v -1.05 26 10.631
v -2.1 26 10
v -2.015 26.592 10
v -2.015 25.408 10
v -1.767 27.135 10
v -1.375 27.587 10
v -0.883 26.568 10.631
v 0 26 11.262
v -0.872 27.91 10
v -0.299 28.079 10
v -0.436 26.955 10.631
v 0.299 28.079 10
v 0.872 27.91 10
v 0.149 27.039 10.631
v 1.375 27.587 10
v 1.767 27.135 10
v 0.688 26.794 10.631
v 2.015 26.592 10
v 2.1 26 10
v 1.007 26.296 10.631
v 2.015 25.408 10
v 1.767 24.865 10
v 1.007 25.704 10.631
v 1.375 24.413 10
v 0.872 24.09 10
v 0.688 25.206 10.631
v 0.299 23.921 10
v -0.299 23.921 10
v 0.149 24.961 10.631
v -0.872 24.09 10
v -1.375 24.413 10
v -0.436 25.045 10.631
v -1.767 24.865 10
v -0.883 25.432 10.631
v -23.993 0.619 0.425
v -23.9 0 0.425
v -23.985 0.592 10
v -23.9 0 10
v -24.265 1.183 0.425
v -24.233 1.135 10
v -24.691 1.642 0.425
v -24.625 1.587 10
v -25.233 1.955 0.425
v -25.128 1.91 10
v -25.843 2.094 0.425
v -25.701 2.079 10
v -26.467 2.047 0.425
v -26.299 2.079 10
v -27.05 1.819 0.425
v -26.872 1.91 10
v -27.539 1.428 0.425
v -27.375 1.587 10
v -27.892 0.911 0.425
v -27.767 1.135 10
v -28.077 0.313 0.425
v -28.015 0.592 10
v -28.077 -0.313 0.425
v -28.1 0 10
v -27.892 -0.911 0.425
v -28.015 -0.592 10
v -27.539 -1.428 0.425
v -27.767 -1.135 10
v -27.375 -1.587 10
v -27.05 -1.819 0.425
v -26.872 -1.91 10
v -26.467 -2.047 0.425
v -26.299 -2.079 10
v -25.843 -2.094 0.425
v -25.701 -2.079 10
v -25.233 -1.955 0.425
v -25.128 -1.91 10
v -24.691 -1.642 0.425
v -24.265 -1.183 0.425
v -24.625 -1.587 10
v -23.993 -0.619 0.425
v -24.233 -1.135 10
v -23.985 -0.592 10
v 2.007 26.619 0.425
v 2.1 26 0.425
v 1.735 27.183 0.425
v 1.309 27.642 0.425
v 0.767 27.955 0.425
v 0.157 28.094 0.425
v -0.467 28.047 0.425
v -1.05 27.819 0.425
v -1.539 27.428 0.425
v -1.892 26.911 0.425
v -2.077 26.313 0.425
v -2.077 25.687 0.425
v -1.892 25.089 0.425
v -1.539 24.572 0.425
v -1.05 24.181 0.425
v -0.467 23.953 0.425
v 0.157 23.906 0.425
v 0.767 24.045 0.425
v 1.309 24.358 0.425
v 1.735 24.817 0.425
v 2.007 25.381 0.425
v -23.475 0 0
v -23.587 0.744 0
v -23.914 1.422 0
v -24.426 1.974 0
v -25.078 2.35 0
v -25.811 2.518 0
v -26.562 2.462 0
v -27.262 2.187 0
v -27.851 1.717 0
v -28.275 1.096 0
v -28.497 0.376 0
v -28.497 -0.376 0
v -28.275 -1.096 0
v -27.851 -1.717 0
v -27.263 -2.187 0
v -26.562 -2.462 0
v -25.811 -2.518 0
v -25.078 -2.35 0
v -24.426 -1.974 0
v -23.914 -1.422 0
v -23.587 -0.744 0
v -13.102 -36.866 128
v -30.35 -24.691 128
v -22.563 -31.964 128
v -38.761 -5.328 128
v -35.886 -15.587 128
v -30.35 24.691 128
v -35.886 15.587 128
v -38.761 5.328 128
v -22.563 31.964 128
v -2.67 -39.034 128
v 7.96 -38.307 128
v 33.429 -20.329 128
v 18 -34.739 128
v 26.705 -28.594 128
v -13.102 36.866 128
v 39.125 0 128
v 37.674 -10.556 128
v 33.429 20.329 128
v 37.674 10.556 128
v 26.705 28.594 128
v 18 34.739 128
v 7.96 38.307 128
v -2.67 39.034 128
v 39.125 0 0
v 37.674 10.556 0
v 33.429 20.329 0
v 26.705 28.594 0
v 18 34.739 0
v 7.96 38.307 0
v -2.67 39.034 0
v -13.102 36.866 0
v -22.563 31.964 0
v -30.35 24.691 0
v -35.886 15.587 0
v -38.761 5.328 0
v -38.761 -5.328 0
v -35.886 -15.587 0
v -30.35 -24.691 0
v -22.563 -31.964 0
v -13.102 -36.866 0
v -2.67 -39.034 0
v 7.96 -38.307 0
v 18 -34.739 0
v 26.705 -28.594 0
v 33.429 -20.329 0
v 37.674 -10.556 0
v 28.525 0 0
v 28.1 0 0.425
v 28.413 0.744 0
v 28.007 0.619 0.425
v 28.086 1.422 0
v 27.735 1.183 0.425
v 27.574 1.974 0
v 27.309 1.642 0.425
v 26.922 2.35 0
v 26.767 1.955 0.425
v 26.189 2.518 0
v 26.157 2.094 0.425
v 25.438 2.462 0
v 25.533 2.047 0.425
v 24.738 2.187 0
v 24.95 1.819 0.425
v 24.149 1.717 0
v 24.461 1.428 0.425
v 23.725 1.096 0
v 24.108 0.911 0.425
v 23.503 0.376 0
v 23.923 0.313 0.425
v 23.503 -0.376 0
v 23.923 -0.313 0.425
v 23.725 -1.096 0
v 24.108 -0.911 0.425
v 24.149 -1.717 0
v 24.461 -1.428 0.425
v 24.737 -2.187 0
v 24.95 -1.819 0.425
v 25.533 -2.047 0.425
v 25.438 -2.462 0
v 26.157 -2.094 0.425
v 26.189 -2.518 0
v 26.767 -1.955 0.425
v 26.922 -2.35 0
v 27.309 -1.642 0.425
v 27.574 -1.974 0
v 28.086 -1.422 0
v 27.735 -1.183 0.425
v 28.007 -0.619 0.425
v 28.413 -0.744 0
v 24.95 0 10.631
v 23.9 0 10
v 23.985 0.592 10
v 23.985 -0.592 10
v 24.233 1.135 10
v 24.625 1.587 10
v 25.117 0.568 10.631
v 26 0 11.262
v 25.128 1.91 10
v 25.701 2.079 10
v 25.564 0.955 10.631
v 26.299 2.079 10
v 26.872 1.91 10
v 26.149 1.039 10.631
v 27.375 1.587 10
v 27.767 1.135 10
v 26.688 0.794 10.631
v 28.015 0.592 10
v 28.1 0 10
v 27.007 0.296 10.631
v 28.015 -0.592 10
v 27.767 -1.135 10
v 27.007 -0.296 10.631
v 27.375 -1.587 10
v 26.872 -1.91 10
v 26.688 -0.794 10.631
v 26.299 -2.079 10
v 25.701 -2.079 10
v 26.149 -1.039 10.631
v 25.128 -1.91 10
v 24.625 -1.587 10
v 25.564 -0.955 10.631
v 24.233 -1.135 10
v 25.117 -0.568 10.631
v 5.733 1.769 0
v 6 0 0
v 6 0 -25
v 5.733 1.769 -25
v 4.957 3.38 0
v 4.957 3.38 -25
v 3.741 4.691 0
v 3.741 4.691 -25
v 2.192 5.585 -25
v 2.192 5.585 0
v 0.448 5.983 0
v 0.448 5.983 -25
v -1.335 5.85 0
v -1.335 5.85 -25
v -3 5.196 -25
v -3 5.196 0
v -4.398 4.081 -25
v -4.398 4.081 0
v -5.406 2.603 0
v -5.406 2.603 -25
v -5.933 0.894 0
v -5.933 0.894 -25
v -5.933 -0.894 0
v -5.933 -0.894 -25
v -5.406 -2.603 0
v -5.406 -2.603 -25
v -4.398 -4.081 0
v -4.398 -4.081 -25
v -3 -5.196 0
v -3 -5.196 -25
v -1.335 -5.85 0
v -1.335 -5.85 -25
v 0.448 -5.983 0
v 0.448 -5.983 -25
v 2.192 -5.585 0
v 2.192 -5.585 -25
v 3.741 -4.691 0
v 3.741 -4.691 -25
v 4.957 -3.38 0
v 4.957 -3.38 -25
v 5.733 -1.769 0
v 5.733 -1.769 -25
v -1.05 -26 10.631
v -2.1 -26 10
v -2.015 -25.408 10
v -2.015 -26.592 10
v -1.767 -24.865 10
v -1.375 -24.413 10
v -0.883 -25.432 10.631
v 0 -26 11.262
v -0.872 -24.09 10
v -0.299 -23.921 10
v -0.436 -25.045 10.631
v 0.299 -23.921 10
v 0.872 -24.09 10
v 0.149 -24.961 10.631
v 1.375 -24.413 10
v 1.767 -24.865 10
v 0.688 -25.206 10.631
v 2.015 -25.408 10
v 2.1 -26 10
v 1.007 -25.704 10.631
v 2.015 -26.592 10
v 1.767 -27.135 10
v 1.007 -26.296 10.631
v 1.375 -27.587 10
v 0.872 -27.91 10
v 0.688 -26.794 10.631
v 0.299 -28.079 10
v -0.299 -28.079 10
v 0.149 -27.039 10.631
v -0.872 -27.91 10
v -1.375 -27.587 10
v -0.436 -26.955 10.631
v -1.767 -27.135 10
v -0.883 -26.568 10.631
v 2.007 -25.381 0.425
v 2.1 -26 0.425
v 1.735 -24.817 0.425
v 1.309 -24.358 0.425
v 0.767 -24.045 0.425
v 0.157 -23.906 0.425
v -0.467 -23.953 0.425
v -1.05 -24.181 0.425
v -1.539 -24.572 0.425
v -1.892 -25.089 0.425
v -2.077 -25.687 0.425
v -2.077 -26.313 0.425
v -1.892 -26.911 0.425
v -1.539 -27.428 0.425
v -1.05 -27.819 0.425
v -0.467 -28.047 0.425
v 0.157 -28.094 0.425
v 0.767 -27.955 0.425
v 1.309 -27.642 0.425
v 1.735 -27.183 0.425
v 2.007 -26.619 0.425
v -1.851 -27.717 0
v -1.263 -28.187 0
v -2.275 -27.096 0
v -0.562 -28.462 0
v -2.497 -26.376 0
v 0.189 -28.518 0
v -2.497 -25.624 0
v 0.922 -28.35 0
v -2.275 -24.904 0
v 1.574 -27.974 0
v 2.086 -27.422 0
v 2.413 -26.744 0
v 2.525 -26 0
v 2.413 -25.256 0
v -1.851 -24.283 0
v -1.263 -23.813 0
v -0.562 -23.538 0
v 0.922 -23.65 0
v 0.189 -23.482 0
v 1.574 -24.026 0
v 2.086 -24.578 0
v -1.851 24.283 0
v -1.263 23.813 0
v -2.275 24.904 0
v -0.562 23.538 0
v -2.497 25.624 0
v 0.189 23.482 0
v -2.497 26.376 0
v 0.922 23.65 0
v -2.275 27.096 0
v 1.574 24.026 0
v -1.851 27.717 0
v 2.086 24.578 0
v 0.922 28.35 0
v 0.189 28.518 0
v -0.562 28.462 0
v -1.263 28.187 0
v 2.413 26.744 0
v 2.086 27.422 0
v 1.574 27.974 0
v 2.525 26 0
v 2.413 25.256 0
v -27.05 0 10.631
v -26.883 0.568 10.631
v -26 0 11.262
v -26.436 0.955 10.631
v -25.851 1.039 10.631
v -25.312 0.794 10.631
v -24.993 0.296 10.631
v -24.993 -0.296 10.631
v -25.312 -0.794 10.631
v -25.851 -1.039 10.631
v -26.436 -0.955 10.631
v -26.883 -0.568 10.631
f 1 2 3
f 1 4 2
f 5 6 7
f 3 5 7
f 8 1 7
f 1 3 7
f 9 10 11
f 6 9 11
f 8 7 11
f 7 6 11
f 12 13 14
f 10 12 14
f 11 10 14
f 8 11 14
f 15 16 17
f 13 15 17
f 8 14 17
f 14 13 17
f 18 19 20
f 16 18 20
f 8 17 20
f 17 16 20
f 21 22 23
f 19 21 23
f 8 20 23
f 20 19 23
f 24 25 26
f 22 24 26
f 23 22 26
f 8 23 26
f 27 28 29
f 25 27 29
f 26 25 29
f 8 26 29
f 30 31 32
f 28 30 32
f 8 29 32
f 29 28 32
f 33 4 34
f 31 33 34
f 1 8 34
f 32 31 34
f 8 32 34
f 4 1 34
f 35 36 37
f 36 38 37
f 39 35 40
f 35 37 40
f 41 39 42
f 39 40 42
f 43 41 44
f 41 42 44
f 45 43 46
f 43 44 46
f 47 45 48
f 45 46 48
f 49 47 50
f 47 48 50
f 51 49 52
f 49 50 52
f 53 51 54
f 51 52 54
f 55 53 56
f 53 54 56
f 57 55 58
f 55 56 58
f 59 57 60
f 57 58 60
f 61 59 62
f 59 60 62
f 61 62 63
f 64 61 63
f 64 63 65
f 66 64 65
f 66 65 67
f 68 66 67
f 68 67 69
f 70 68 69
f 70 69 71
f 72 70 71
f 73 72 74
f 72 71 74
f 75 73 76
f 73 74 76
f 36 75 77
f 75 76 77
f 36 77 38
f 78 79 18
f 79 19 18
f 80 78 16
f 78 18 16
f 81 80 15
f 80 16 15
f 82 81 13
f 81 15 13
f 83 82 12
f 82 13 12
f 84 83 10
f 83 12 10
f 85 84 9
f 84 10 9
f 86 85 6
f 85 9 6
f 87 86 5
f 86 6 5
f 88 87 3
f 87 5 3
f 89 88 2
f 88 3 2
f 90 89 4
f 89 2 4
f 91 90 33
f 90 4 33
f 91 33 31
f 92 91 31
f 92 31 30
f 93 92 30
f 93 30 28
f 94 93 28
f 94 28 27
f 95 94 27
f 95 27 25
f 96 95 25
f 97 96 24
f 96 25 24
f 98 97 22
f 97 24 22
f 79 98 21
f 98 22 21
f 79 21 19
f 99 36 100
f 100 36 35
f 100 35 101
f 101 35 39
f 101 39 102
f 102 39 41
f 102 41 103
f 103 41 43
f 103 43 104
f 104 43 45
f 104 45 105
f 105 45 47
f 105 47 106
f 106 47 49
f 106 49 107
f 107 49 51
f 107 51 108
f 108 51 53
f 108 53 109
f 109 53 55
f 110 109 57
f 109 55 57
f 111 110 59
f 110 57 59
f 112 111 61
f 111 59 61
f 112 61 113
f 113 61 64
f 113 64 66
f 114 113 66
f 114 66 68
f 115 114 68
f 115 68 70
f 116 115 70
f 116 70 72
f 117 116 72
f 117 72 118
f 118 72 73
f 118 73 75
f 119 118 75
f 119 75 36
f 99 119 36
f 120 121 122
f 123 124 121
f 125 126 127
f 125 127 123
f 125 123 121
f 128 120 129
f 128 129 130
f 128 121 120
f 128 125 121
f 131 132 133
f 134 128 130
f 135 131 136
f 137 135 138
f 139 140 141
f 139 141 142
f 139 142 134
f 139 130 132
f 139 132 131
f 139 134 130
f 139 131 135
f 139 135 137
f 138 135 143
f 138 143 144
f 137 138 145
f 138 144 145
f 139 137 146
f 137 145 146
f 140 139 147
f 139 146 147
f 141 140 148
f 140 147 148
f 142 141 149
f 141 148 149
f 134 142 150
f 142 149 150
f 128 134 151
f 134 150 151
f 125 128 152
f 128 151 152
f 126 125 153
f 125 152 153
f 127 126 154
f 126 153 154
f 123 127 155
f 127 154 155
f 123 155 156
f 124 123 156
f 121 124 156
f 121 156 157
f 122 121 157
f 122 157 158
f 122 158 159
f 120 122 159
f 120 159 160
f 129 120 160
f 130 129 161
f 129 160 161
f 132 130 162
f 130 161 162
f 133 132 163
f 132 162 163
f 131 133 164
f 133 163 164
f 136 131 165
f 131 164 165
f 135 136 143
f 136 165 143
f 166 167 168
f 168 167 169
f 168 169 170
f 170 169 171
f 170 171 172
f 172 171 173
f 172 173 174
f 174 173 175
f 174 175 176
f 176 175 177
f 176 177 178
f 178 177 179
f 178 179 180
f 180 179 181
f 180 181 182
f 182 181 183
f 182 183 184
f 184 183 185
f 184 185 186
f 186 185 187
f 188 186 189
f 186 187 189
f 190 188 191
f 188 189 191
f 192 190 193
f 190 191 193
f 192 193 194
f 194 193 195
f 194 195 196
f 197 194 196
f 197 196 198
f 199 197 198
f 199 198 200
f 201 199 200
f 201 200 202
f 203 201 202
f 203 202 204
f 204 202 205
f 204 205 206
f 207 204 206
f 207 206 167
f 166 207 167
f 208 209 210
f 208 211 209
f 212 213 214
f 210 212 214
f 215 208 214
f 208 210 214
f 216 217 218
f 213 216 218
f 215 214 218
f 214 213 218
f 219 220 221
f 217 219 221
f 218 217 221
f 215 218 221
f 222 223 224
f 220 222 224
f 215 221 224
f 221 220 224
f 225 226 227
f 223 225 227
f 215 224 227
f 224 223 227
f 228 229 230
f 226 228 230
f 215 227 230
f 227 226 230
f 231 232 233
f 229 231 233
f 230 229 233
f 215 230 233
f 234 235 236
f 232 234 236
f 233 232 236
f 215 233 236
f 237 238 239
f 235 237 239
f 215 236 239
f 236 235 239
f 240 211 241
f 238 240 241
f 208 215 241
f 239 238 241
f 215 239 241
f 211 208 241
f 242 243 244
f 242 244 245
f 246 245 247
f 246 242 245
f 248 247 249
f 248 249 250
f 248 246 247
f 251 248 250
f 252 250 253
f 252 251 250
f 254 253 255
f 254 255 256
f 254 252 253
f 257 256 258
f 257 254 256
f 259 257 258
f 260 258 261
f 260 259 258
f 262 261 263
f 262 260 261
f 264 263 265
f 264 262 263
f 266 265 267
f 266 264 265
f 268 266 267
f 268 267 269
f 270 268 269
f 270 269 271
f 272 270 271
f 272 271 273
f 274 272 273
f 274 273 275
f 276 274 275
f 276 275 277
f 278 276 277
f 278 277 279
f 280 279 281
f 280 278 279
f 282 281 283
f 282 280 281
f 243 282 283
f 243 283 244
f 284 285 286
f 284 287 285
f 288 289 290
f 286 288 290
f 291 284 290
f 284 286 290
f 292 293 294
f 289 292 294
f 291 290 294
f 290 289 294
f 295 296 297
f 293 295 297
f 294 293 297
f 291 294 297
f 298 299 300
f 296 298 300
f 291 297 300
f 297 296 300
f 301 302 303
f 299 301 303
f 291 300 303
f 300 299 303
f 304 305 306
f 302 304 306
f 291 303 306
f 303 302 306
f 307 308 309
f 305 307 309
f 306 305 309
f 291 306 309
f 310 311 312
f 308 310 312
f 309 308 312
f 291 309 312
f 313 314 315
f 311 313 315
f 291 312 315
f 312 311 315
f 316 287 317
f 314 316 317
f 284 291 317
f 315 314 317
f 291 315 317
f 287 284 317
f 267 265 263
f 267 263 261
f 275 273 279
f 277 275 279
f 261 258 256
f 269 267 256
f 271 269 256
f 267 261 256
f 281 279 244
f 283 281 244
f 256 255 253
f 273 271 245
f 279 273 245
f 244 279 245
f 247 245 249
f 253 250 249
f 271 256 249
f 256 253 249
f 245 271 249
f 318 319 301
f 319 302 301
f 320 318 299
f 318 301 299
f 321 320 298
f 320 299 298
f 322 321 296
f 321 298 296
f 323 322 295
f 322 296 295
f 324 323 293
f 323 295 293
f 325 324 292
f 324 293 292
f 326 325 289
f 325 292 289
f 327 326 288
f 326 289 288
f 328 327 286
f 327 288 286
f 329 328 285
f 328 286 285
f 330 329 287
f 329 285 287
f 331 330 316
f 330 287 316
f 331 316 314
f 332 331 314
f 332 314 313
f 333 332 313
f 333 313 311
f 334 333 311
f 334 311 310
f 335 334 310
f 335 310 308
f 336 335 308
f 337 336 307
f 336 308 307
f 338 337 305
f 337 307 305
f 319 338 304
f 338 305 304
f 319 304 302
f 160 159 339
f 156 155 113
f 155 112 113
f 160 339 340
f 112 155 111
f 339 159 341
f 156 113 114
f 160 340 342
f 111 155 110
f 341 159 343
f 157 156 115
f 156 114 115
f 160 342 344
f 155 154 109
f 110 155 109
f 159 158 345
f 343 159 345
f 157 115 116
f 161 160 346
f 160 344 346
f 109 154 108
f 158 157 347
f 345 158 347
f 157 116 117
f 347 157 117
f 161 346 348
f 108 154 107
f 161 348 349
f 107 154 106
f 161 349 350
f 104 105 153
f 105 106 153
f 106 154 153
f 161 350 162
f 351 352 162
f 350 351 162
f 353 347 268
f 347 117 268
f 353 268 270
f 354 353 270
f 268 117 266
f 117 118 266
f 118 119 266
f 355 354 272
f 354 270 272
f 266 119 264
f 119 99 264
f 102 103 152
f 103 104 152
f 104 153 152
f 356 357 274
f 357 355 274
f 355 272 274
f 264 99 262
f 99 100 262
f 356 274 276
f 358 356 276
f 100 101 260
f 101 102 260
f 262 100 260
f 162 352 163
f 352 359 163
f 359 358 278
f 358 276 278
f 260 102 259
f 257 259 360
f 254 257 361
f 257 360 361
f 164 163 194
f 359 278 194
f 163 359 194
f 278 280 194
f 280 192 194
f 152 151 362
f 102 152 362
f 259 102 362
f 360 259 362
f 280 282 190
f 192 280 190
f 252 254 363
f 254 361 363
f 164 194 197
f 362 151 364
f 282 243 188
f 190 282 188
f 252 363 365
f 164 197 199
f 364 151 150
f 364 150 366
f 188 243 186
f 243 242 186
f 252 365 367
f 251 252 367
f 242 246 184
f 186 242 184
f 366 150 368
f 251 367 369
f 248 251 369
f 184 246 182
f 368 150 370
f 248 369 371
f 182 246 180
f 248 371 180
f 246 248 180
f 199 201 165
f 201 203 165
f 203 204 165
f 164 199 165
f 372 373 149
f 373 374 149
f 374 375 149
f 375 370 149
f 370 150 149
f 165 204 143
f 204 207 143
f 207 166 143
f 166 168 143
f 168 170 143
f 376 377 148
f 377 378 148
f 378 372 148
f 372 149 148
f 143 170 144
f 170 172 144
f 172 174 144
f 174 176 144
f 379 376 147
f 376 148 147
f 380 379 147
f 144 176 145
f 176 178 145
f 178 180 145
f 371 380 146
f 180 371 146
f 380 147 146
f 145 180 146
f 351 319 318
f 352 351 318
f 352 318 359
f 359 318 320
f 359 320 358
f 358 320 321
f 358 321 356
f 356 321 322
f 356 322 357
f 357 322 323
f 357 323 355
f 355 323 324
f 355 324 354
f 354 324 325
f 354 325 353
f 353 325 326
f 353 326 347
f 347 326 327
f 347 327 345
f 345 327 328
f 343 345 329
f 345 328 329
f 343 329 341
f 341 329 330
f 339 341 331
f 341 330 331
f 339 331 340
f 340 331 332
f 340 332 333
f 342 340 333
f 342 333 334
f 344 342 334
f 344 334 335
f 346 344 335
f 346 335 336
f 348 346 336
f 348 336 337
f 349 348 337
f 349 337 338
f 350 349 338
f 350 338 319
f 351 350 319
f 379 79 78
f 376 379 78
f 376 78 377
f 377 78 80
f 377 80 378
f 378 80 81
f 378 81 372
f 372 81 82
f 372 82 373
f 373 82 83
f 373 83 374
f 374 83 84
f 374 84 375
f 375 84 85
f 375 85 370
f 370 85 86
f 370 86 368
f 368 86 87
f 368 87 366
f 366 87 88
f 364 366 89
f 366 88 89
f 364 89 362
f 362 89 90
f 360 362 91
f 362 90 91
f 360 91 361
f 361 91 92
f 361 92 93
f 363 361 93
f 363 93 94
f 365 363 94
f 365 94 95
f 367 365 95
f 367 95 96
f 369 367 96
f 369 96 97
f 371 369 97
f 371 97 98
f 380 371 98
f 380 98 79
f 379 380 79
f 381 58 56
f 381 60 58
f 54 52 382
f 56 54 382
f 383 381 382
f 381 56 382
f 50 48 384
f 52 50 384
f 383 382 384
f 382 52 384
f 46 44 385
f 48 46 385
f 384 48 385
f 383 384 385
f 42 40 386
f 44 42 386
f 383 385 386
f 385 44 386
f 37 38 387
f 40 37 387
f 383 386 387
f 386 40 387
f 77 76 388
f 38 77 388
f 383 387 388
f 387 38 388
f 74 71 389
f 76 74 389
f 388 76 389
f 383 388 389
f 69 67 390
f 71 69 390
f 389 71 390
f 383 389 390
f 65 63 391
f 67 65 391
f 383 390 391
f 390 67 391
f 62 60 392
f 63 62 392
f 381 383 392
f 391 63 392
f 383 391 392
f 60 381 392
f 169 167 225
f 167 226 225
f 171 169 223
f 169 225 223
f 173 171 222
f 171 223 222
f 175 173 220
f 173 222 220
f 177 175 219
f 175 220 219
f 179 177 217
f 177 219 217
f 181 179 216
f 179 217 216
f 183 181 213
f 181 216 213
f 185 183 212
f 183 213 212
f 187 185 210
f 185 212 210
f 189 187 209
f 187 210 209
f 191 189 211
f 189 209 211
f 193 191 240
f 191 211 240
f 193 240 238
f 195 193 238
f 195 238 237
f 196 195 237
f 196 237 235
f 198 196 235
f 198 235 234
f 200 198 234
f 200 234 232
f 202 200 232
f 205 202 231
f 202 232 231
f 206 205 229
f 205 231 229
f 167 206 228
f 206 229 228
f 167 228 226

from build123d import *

# Parameters (mm, degrees)
ESBO_O1_R                       = 39.125
RESSALTO_EXTRUS_O1_DEPTH        = 128
FURO_ROSCADO_DE_M51_D           = 4.2
FURO_ROSCADO_DE_M51_DEPTH       = 10
FURO_ROSCADO_DE_M51_CSINK_D     = 5.05
FURO_ROSCADO_DE_M51_CSINK_ANGLE = 90
FURO_ROSCADO_DE_M51_TIP         = 1.2618073
ESBO_O1_4_R                     = 6
RESSALTO_EXTRUS_O2_DEPTH        = 25


with BuildPart() as part:
    # Esboço1 → Ressalto-extrusão1 (new body)
    with BuildSketch(Plane.XY):
        Circle(ESBO_O1_R)
    extrude(amount=RESSALTO_EXTRUS_O1_DEPTH)

    # Furo roscado de M51
    with Locations(Plane(origin=(0, 0, 0), x_dir=(-1, 0, 0), z_dir=(0, 0, -1))):
        with Locations((0, 26), (-26, 0), (0, -26), (26, 0)):
            CounterSinkHole(FURO_ROSCADO_DE_M51_D / 2, FURO_ROSCADO_DE_M51_CSINK_D / 2, depth=FURO_ROSCADO_DE_M51_DEPTH, counter_sink_angle=FURO_ROSCADO_DE_M51_CSINK_ANGLE)
            with Locations((0, 0, -(FURO_ROSCADO_DE_M51_DEPTH + FURO_ROSCADO_DE_M51_TIP / 2))):  # 118° drill point
                Cone(0, FURO_ROSCADO_DE_M51_D / 2, FURO_ROSCADO_DE_M51_TIP, mode=Mode.SUBTRACT)

    # Esboço1<4> → Ressalto-extrusão2 (add)
    with BuildSketch(Plane.XY):
        Circle(ESBO_O1_4_R)
    extrude(amount=-RESSALTO_EXTRUS_O2_DEPTH)


solid = part.part
